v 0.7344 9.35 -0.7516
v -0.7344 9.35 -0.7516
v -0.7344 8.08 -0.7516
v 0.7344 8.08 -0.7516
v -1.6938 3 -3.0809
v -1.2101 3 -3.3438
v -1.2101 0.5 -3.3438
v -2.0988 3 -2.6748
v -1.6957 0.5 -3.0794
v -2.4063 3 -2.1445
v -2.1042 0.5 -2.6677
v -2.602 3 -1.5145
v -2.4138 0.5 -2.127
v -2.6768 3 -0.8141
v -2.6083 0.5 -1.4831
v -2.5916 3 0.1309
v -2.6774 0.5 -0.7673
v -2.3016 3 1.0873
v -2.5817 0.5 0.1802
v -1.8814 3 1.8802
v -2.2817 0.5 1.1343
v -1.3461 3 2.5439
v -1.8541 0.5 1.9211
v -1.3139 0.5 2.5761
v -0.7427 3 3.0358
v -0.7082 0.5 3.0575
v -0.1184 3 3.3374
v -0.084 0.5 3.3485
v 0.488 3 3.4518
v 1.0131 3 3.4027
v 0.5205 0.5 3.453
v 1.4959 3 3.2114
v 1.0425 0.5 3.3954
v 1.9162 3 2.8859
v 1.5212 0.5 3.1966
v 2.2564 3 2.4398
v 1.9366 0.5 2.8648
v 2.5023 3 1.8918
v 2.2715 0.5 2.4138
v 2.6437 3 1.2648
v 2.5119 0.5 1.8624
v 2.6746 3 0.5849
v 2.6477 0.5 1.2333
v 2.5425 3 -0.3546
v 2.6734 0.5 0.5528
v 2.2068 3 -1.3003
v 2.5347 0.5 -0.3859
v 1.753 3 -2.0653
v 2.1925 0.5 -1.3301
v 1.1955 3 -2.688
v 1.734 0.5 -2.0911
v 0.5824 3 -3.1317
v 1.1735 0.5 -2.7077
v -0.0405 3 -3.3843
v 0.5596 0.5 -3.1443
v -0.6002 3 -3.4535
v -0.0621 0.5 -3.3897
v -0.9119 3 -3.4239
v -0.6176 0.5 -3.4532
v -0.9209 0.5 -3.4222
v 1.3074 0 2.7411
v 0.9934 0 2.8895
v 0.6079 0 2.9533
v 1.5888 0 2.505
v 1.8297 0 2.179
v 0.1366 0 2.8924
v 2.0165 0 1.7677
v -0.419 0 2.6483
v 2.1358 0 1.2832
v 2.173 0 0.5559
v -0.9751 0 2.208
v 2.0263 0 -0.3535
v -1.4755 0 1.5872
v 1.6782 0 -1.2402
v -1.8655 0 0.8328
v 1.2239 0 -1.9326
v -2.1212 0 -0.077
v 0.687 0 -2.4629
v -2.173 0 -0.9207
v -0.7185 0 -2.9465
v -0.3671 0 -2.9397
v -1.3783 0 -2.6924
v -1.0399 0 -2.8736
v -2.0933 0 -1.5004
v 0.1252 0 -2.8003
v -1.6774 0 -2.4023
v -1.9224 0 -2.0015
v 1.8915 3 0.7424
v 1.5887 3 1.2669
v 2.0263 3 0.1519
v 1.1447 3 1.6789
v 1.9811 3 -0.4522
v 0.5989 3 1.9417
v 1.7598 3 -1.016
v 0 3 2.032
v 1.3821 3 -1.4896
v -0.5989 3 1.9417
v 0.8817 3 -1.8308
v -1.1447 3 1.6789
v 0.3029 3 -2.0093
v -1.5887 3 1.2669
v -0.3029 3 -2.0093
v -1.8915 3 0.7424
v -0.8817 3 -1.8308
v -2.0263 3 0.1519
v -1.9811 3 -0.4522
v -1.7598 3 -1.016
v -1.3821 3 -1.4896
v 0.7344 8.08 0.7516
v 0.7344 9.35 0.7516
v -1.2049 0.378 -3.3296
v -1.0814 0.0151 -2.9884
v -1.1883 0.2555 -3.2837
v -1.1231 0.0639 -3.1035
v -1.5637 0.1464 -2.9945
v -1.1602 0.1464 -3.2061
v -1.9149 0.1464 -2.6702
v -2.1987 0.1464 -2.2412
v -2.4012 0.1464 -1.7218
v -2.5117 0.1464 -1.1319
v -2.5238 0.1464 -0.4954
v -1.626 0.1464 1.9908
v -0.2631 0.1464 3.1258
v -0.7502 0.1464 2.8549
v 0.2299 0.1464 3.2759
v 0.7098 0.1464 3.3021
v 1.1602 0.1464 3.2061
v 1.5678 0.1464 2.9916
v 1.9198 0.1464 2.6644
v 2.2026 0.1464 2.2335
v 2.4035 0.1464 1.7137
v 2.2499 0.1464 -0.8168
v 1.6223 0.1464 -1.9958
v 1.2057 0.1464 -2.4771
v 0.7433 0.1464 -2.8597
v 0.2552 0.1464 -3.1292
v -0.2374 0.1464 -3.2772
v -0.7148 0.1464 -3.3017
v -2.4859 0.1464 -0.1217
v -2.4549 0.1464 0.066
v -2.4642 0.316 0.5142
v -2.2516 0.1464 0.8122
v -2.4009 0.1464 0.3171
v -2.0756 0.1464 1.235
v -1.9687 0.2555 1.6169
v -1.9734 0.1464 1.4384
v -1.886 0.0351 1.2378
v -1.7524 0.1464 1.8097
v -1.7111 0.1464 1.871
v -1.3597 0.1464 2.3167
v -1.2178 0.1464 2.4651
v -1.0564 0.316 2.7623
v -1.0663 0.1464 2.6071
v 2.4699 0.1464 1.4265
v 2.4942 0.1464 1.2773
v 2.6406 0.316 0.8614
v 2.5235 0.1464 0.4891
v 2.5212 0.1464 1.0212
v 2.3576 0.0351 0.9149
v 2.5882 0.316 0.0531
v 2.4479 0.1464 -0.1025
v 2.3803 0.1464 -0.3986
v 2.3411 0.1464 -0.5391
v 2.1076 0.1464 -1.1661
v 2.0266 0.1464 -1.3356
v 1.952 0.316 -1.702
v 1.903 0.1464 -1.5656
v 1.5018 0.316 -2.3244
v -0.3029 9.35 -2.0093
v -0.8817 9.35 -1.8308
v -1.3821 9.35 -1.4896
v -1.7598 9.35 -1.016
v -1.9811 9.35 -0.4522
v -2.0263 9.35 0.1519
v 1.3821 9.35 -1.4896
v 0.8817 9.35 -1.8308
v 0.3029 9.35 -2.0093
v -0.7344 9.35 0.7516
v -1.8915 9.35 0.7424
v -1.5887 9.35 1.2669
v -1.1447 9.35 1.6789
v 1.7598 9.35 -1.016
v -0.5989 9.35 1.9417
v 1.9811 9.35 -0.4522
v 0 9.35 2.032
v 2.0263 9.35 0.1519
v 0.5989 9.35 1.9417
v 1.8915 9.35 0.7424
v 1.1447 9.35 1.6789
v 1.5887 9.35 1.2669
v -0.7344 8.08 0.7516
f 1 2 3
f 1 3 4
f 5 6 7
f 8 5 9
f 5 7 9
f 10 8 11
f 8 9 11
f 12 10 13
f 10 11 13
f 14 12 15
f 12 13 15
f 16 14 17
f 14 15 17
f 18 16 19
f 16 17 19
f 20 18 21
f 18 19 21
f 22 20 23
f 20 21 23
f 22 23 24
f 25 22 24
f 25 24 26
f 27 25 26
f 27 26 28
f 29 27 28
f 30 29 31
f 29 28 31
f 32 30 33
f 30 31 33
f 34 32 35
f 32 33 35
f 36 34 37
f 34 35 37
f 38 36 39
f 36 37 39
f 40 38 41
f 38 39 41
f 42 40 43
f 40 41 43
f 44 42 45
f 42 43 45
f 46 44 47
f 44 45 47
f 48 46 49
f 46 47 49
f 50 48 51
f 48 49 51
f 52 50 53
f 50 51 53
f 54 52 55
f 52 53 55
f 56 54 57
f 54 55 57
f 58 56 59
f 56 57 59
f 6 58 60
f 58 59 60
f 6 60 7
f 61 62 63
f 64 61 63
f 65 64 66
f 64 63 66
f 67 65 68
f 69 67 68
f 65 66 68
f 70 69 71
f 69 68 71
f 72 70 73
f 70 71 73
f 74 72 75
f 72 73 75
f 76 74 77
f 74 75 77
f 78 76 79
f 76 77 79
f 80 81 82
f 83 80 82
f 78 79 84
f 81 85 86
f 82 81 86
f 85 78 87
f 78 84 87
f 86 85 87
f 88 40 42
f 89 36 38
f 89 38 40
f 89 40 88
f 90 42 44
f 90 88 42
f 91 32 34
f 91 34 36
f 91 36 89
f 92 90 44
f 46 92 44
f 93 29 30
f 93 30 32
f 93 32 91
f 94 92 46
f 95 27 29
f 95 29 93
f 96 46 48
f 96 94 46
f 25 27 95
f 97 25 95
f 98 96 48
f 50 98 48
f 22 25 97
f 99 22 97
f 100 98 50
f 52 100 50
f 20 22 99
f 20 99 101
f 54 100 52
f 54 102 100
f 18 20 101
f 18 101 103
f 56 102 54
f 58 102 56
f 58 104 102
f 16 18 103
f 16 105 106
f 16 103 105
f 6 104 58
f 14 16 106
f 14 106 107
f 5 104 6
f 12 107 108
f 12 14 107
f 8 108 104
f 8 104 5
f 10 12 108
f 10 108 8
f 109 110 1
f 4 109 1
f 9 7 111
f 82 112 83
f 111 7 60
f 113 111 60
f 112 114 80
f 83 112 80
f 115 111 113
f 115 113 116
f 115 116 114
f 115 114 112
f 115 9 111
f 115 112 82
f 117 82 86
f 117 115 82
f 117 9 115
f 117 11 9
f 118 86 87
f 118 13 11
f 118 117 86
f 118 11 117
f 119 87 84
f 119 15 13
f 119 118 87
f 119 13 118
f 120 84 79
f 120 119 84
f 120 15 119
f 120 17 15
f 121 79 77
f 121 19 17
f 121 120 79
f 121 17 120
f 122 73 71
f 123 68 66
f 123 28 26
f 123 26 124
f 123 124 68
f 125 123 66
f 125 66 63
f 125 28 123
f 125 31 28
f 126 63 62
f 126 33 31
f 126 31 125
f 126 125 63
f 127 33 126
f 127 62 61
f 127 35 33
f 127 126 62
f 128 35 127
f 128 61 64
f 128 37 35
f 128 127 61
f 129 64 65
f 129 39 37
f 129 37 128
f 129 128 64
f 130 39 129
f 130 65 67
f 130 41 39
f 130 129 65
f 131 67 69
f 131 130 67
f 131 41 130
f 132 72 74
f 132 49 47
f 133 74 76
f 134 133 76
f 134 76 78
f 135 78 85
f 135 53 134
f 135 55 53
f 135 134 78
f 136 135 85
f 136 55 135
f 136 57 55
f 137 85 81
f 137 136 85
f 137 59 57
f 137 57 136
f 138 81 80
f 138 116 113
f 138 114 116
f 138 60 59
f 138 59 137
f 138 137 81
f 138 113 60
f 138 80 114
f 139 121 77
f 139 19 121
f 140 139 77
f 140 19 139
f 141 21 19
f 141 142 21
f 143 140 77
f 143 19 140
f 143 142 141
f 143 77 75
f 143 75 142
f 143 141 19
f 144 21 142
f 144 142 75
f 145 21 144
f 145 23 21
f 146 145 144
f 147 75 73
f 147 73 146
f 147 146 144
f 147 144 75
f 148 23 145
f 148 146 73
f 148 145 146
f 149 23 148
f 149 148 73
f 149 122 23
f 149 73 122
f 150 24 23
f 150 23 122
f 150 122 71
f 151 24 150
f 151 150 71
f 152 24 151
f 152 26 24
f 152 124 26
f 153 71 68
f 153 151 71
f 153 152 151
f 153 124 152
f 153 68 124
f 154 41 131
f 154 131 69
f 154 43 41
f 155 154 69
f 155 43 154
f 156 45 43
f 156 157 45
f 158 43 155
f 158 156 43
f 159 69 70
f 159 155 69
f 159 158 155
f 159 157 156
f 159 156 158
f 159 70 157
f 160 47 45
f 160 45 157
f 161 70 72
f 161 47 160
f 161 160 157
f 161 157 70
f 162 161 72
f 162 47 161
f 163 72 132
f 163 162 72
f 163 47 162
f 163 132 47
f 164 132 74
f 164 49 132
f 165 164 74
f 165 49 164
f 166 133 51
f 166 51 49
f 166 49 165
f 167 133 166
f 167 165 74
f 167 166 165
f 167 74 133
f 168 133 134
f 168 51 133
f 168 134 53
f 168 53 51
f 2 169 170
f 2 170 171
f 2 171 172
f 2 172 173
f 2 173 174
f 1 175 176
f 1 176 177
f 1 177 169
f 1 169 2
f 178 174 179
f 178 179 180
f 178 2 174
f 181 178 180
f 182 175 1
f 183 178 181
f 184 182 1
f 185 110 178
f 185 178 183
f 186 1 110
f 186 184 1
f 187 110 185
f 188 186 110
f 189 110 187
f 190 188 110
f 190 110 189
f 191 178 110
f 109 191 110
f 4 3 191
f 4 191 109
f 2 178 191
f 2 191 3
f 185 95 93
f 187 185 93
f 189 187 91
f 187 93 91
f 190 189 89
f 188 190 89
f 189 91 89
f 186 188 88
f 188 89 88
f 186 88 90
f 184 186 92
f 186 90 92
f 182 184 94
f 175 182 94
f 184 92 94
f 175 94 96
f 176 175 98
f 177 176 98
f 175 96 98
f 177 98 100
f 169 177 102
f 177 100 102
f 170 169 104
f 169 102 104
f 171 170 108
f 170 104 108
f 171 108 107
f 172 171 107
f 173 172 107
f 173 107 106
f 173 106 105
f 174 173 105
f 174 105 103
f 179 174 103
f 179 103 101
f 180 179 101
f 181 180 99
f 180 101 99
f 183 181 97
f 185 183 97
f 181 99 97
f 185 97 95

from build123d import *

# Parameters (mm, degrees)
SKETCH1_RX          = 3.556
SKETCH1_RY          = 2.54
BOSS_EXTRUDE1_DEPTH = 3
SKETCH2_R           = 2.032
BOSS_EXTRUDE2_DEPTH = 6.35
SKETCH3_W           = 1.468765614
SKETCH3_H           = 1.503189808
CUT_EXTRUDE1_DEPTH  = 1.27
FILLET1_R           = 0.5


with BuildPart() as part:
    # Sketch1 → Boss-Extrude1 (new body)
    with BuildSketch(Plane(origin=(0, 0, 0), x_dir=(1, 0, 0), z_dir=(0, 1, 0))):
        with Locations(Location((0, 0), (0, 0, 109.894492076))):
            Ellipse(SKETCH1_RX, SKETCH1_RY)
    extrude(amount=BOSS_EXTRUDE1_DEPTH)

    # Sketch2 → Boss-Extrude2 (add)
    with BuildSketch(Plane(origin=(0, 3, 0), x_dir=(1, 0, 0), z_dir=(0, 1, 0))):
        with Locations(Location((0, 0, 0), (0, 0, 270))):
            Circle(SKETCH2_R)
    extrude(amount=BOSS_EXTRUDE2_DEPTH)

    # Sketch3 → Cut-Extrude1 (cut)
    with BuildSketch(Plane(origin=(0, 9.35, 0), x_dir=(1, 0, 0), z_dir=(0, 1, 0))):
        Rectangle(SKETCH3_W, SKETCH3_H)
    extrude(amount=-CUT_EXTRUDE1_DEPTH, mode=Mode.SUBTRACT)

    # Fillet1
    fillet1_edges = [part.edges().sort_by_distance(p)[0] for p in [
        (1.211452415, 0, 3.343279373),
    ]]
    fillet(fillet1_edges, radius=FILLET1_R)


solid = part.part
